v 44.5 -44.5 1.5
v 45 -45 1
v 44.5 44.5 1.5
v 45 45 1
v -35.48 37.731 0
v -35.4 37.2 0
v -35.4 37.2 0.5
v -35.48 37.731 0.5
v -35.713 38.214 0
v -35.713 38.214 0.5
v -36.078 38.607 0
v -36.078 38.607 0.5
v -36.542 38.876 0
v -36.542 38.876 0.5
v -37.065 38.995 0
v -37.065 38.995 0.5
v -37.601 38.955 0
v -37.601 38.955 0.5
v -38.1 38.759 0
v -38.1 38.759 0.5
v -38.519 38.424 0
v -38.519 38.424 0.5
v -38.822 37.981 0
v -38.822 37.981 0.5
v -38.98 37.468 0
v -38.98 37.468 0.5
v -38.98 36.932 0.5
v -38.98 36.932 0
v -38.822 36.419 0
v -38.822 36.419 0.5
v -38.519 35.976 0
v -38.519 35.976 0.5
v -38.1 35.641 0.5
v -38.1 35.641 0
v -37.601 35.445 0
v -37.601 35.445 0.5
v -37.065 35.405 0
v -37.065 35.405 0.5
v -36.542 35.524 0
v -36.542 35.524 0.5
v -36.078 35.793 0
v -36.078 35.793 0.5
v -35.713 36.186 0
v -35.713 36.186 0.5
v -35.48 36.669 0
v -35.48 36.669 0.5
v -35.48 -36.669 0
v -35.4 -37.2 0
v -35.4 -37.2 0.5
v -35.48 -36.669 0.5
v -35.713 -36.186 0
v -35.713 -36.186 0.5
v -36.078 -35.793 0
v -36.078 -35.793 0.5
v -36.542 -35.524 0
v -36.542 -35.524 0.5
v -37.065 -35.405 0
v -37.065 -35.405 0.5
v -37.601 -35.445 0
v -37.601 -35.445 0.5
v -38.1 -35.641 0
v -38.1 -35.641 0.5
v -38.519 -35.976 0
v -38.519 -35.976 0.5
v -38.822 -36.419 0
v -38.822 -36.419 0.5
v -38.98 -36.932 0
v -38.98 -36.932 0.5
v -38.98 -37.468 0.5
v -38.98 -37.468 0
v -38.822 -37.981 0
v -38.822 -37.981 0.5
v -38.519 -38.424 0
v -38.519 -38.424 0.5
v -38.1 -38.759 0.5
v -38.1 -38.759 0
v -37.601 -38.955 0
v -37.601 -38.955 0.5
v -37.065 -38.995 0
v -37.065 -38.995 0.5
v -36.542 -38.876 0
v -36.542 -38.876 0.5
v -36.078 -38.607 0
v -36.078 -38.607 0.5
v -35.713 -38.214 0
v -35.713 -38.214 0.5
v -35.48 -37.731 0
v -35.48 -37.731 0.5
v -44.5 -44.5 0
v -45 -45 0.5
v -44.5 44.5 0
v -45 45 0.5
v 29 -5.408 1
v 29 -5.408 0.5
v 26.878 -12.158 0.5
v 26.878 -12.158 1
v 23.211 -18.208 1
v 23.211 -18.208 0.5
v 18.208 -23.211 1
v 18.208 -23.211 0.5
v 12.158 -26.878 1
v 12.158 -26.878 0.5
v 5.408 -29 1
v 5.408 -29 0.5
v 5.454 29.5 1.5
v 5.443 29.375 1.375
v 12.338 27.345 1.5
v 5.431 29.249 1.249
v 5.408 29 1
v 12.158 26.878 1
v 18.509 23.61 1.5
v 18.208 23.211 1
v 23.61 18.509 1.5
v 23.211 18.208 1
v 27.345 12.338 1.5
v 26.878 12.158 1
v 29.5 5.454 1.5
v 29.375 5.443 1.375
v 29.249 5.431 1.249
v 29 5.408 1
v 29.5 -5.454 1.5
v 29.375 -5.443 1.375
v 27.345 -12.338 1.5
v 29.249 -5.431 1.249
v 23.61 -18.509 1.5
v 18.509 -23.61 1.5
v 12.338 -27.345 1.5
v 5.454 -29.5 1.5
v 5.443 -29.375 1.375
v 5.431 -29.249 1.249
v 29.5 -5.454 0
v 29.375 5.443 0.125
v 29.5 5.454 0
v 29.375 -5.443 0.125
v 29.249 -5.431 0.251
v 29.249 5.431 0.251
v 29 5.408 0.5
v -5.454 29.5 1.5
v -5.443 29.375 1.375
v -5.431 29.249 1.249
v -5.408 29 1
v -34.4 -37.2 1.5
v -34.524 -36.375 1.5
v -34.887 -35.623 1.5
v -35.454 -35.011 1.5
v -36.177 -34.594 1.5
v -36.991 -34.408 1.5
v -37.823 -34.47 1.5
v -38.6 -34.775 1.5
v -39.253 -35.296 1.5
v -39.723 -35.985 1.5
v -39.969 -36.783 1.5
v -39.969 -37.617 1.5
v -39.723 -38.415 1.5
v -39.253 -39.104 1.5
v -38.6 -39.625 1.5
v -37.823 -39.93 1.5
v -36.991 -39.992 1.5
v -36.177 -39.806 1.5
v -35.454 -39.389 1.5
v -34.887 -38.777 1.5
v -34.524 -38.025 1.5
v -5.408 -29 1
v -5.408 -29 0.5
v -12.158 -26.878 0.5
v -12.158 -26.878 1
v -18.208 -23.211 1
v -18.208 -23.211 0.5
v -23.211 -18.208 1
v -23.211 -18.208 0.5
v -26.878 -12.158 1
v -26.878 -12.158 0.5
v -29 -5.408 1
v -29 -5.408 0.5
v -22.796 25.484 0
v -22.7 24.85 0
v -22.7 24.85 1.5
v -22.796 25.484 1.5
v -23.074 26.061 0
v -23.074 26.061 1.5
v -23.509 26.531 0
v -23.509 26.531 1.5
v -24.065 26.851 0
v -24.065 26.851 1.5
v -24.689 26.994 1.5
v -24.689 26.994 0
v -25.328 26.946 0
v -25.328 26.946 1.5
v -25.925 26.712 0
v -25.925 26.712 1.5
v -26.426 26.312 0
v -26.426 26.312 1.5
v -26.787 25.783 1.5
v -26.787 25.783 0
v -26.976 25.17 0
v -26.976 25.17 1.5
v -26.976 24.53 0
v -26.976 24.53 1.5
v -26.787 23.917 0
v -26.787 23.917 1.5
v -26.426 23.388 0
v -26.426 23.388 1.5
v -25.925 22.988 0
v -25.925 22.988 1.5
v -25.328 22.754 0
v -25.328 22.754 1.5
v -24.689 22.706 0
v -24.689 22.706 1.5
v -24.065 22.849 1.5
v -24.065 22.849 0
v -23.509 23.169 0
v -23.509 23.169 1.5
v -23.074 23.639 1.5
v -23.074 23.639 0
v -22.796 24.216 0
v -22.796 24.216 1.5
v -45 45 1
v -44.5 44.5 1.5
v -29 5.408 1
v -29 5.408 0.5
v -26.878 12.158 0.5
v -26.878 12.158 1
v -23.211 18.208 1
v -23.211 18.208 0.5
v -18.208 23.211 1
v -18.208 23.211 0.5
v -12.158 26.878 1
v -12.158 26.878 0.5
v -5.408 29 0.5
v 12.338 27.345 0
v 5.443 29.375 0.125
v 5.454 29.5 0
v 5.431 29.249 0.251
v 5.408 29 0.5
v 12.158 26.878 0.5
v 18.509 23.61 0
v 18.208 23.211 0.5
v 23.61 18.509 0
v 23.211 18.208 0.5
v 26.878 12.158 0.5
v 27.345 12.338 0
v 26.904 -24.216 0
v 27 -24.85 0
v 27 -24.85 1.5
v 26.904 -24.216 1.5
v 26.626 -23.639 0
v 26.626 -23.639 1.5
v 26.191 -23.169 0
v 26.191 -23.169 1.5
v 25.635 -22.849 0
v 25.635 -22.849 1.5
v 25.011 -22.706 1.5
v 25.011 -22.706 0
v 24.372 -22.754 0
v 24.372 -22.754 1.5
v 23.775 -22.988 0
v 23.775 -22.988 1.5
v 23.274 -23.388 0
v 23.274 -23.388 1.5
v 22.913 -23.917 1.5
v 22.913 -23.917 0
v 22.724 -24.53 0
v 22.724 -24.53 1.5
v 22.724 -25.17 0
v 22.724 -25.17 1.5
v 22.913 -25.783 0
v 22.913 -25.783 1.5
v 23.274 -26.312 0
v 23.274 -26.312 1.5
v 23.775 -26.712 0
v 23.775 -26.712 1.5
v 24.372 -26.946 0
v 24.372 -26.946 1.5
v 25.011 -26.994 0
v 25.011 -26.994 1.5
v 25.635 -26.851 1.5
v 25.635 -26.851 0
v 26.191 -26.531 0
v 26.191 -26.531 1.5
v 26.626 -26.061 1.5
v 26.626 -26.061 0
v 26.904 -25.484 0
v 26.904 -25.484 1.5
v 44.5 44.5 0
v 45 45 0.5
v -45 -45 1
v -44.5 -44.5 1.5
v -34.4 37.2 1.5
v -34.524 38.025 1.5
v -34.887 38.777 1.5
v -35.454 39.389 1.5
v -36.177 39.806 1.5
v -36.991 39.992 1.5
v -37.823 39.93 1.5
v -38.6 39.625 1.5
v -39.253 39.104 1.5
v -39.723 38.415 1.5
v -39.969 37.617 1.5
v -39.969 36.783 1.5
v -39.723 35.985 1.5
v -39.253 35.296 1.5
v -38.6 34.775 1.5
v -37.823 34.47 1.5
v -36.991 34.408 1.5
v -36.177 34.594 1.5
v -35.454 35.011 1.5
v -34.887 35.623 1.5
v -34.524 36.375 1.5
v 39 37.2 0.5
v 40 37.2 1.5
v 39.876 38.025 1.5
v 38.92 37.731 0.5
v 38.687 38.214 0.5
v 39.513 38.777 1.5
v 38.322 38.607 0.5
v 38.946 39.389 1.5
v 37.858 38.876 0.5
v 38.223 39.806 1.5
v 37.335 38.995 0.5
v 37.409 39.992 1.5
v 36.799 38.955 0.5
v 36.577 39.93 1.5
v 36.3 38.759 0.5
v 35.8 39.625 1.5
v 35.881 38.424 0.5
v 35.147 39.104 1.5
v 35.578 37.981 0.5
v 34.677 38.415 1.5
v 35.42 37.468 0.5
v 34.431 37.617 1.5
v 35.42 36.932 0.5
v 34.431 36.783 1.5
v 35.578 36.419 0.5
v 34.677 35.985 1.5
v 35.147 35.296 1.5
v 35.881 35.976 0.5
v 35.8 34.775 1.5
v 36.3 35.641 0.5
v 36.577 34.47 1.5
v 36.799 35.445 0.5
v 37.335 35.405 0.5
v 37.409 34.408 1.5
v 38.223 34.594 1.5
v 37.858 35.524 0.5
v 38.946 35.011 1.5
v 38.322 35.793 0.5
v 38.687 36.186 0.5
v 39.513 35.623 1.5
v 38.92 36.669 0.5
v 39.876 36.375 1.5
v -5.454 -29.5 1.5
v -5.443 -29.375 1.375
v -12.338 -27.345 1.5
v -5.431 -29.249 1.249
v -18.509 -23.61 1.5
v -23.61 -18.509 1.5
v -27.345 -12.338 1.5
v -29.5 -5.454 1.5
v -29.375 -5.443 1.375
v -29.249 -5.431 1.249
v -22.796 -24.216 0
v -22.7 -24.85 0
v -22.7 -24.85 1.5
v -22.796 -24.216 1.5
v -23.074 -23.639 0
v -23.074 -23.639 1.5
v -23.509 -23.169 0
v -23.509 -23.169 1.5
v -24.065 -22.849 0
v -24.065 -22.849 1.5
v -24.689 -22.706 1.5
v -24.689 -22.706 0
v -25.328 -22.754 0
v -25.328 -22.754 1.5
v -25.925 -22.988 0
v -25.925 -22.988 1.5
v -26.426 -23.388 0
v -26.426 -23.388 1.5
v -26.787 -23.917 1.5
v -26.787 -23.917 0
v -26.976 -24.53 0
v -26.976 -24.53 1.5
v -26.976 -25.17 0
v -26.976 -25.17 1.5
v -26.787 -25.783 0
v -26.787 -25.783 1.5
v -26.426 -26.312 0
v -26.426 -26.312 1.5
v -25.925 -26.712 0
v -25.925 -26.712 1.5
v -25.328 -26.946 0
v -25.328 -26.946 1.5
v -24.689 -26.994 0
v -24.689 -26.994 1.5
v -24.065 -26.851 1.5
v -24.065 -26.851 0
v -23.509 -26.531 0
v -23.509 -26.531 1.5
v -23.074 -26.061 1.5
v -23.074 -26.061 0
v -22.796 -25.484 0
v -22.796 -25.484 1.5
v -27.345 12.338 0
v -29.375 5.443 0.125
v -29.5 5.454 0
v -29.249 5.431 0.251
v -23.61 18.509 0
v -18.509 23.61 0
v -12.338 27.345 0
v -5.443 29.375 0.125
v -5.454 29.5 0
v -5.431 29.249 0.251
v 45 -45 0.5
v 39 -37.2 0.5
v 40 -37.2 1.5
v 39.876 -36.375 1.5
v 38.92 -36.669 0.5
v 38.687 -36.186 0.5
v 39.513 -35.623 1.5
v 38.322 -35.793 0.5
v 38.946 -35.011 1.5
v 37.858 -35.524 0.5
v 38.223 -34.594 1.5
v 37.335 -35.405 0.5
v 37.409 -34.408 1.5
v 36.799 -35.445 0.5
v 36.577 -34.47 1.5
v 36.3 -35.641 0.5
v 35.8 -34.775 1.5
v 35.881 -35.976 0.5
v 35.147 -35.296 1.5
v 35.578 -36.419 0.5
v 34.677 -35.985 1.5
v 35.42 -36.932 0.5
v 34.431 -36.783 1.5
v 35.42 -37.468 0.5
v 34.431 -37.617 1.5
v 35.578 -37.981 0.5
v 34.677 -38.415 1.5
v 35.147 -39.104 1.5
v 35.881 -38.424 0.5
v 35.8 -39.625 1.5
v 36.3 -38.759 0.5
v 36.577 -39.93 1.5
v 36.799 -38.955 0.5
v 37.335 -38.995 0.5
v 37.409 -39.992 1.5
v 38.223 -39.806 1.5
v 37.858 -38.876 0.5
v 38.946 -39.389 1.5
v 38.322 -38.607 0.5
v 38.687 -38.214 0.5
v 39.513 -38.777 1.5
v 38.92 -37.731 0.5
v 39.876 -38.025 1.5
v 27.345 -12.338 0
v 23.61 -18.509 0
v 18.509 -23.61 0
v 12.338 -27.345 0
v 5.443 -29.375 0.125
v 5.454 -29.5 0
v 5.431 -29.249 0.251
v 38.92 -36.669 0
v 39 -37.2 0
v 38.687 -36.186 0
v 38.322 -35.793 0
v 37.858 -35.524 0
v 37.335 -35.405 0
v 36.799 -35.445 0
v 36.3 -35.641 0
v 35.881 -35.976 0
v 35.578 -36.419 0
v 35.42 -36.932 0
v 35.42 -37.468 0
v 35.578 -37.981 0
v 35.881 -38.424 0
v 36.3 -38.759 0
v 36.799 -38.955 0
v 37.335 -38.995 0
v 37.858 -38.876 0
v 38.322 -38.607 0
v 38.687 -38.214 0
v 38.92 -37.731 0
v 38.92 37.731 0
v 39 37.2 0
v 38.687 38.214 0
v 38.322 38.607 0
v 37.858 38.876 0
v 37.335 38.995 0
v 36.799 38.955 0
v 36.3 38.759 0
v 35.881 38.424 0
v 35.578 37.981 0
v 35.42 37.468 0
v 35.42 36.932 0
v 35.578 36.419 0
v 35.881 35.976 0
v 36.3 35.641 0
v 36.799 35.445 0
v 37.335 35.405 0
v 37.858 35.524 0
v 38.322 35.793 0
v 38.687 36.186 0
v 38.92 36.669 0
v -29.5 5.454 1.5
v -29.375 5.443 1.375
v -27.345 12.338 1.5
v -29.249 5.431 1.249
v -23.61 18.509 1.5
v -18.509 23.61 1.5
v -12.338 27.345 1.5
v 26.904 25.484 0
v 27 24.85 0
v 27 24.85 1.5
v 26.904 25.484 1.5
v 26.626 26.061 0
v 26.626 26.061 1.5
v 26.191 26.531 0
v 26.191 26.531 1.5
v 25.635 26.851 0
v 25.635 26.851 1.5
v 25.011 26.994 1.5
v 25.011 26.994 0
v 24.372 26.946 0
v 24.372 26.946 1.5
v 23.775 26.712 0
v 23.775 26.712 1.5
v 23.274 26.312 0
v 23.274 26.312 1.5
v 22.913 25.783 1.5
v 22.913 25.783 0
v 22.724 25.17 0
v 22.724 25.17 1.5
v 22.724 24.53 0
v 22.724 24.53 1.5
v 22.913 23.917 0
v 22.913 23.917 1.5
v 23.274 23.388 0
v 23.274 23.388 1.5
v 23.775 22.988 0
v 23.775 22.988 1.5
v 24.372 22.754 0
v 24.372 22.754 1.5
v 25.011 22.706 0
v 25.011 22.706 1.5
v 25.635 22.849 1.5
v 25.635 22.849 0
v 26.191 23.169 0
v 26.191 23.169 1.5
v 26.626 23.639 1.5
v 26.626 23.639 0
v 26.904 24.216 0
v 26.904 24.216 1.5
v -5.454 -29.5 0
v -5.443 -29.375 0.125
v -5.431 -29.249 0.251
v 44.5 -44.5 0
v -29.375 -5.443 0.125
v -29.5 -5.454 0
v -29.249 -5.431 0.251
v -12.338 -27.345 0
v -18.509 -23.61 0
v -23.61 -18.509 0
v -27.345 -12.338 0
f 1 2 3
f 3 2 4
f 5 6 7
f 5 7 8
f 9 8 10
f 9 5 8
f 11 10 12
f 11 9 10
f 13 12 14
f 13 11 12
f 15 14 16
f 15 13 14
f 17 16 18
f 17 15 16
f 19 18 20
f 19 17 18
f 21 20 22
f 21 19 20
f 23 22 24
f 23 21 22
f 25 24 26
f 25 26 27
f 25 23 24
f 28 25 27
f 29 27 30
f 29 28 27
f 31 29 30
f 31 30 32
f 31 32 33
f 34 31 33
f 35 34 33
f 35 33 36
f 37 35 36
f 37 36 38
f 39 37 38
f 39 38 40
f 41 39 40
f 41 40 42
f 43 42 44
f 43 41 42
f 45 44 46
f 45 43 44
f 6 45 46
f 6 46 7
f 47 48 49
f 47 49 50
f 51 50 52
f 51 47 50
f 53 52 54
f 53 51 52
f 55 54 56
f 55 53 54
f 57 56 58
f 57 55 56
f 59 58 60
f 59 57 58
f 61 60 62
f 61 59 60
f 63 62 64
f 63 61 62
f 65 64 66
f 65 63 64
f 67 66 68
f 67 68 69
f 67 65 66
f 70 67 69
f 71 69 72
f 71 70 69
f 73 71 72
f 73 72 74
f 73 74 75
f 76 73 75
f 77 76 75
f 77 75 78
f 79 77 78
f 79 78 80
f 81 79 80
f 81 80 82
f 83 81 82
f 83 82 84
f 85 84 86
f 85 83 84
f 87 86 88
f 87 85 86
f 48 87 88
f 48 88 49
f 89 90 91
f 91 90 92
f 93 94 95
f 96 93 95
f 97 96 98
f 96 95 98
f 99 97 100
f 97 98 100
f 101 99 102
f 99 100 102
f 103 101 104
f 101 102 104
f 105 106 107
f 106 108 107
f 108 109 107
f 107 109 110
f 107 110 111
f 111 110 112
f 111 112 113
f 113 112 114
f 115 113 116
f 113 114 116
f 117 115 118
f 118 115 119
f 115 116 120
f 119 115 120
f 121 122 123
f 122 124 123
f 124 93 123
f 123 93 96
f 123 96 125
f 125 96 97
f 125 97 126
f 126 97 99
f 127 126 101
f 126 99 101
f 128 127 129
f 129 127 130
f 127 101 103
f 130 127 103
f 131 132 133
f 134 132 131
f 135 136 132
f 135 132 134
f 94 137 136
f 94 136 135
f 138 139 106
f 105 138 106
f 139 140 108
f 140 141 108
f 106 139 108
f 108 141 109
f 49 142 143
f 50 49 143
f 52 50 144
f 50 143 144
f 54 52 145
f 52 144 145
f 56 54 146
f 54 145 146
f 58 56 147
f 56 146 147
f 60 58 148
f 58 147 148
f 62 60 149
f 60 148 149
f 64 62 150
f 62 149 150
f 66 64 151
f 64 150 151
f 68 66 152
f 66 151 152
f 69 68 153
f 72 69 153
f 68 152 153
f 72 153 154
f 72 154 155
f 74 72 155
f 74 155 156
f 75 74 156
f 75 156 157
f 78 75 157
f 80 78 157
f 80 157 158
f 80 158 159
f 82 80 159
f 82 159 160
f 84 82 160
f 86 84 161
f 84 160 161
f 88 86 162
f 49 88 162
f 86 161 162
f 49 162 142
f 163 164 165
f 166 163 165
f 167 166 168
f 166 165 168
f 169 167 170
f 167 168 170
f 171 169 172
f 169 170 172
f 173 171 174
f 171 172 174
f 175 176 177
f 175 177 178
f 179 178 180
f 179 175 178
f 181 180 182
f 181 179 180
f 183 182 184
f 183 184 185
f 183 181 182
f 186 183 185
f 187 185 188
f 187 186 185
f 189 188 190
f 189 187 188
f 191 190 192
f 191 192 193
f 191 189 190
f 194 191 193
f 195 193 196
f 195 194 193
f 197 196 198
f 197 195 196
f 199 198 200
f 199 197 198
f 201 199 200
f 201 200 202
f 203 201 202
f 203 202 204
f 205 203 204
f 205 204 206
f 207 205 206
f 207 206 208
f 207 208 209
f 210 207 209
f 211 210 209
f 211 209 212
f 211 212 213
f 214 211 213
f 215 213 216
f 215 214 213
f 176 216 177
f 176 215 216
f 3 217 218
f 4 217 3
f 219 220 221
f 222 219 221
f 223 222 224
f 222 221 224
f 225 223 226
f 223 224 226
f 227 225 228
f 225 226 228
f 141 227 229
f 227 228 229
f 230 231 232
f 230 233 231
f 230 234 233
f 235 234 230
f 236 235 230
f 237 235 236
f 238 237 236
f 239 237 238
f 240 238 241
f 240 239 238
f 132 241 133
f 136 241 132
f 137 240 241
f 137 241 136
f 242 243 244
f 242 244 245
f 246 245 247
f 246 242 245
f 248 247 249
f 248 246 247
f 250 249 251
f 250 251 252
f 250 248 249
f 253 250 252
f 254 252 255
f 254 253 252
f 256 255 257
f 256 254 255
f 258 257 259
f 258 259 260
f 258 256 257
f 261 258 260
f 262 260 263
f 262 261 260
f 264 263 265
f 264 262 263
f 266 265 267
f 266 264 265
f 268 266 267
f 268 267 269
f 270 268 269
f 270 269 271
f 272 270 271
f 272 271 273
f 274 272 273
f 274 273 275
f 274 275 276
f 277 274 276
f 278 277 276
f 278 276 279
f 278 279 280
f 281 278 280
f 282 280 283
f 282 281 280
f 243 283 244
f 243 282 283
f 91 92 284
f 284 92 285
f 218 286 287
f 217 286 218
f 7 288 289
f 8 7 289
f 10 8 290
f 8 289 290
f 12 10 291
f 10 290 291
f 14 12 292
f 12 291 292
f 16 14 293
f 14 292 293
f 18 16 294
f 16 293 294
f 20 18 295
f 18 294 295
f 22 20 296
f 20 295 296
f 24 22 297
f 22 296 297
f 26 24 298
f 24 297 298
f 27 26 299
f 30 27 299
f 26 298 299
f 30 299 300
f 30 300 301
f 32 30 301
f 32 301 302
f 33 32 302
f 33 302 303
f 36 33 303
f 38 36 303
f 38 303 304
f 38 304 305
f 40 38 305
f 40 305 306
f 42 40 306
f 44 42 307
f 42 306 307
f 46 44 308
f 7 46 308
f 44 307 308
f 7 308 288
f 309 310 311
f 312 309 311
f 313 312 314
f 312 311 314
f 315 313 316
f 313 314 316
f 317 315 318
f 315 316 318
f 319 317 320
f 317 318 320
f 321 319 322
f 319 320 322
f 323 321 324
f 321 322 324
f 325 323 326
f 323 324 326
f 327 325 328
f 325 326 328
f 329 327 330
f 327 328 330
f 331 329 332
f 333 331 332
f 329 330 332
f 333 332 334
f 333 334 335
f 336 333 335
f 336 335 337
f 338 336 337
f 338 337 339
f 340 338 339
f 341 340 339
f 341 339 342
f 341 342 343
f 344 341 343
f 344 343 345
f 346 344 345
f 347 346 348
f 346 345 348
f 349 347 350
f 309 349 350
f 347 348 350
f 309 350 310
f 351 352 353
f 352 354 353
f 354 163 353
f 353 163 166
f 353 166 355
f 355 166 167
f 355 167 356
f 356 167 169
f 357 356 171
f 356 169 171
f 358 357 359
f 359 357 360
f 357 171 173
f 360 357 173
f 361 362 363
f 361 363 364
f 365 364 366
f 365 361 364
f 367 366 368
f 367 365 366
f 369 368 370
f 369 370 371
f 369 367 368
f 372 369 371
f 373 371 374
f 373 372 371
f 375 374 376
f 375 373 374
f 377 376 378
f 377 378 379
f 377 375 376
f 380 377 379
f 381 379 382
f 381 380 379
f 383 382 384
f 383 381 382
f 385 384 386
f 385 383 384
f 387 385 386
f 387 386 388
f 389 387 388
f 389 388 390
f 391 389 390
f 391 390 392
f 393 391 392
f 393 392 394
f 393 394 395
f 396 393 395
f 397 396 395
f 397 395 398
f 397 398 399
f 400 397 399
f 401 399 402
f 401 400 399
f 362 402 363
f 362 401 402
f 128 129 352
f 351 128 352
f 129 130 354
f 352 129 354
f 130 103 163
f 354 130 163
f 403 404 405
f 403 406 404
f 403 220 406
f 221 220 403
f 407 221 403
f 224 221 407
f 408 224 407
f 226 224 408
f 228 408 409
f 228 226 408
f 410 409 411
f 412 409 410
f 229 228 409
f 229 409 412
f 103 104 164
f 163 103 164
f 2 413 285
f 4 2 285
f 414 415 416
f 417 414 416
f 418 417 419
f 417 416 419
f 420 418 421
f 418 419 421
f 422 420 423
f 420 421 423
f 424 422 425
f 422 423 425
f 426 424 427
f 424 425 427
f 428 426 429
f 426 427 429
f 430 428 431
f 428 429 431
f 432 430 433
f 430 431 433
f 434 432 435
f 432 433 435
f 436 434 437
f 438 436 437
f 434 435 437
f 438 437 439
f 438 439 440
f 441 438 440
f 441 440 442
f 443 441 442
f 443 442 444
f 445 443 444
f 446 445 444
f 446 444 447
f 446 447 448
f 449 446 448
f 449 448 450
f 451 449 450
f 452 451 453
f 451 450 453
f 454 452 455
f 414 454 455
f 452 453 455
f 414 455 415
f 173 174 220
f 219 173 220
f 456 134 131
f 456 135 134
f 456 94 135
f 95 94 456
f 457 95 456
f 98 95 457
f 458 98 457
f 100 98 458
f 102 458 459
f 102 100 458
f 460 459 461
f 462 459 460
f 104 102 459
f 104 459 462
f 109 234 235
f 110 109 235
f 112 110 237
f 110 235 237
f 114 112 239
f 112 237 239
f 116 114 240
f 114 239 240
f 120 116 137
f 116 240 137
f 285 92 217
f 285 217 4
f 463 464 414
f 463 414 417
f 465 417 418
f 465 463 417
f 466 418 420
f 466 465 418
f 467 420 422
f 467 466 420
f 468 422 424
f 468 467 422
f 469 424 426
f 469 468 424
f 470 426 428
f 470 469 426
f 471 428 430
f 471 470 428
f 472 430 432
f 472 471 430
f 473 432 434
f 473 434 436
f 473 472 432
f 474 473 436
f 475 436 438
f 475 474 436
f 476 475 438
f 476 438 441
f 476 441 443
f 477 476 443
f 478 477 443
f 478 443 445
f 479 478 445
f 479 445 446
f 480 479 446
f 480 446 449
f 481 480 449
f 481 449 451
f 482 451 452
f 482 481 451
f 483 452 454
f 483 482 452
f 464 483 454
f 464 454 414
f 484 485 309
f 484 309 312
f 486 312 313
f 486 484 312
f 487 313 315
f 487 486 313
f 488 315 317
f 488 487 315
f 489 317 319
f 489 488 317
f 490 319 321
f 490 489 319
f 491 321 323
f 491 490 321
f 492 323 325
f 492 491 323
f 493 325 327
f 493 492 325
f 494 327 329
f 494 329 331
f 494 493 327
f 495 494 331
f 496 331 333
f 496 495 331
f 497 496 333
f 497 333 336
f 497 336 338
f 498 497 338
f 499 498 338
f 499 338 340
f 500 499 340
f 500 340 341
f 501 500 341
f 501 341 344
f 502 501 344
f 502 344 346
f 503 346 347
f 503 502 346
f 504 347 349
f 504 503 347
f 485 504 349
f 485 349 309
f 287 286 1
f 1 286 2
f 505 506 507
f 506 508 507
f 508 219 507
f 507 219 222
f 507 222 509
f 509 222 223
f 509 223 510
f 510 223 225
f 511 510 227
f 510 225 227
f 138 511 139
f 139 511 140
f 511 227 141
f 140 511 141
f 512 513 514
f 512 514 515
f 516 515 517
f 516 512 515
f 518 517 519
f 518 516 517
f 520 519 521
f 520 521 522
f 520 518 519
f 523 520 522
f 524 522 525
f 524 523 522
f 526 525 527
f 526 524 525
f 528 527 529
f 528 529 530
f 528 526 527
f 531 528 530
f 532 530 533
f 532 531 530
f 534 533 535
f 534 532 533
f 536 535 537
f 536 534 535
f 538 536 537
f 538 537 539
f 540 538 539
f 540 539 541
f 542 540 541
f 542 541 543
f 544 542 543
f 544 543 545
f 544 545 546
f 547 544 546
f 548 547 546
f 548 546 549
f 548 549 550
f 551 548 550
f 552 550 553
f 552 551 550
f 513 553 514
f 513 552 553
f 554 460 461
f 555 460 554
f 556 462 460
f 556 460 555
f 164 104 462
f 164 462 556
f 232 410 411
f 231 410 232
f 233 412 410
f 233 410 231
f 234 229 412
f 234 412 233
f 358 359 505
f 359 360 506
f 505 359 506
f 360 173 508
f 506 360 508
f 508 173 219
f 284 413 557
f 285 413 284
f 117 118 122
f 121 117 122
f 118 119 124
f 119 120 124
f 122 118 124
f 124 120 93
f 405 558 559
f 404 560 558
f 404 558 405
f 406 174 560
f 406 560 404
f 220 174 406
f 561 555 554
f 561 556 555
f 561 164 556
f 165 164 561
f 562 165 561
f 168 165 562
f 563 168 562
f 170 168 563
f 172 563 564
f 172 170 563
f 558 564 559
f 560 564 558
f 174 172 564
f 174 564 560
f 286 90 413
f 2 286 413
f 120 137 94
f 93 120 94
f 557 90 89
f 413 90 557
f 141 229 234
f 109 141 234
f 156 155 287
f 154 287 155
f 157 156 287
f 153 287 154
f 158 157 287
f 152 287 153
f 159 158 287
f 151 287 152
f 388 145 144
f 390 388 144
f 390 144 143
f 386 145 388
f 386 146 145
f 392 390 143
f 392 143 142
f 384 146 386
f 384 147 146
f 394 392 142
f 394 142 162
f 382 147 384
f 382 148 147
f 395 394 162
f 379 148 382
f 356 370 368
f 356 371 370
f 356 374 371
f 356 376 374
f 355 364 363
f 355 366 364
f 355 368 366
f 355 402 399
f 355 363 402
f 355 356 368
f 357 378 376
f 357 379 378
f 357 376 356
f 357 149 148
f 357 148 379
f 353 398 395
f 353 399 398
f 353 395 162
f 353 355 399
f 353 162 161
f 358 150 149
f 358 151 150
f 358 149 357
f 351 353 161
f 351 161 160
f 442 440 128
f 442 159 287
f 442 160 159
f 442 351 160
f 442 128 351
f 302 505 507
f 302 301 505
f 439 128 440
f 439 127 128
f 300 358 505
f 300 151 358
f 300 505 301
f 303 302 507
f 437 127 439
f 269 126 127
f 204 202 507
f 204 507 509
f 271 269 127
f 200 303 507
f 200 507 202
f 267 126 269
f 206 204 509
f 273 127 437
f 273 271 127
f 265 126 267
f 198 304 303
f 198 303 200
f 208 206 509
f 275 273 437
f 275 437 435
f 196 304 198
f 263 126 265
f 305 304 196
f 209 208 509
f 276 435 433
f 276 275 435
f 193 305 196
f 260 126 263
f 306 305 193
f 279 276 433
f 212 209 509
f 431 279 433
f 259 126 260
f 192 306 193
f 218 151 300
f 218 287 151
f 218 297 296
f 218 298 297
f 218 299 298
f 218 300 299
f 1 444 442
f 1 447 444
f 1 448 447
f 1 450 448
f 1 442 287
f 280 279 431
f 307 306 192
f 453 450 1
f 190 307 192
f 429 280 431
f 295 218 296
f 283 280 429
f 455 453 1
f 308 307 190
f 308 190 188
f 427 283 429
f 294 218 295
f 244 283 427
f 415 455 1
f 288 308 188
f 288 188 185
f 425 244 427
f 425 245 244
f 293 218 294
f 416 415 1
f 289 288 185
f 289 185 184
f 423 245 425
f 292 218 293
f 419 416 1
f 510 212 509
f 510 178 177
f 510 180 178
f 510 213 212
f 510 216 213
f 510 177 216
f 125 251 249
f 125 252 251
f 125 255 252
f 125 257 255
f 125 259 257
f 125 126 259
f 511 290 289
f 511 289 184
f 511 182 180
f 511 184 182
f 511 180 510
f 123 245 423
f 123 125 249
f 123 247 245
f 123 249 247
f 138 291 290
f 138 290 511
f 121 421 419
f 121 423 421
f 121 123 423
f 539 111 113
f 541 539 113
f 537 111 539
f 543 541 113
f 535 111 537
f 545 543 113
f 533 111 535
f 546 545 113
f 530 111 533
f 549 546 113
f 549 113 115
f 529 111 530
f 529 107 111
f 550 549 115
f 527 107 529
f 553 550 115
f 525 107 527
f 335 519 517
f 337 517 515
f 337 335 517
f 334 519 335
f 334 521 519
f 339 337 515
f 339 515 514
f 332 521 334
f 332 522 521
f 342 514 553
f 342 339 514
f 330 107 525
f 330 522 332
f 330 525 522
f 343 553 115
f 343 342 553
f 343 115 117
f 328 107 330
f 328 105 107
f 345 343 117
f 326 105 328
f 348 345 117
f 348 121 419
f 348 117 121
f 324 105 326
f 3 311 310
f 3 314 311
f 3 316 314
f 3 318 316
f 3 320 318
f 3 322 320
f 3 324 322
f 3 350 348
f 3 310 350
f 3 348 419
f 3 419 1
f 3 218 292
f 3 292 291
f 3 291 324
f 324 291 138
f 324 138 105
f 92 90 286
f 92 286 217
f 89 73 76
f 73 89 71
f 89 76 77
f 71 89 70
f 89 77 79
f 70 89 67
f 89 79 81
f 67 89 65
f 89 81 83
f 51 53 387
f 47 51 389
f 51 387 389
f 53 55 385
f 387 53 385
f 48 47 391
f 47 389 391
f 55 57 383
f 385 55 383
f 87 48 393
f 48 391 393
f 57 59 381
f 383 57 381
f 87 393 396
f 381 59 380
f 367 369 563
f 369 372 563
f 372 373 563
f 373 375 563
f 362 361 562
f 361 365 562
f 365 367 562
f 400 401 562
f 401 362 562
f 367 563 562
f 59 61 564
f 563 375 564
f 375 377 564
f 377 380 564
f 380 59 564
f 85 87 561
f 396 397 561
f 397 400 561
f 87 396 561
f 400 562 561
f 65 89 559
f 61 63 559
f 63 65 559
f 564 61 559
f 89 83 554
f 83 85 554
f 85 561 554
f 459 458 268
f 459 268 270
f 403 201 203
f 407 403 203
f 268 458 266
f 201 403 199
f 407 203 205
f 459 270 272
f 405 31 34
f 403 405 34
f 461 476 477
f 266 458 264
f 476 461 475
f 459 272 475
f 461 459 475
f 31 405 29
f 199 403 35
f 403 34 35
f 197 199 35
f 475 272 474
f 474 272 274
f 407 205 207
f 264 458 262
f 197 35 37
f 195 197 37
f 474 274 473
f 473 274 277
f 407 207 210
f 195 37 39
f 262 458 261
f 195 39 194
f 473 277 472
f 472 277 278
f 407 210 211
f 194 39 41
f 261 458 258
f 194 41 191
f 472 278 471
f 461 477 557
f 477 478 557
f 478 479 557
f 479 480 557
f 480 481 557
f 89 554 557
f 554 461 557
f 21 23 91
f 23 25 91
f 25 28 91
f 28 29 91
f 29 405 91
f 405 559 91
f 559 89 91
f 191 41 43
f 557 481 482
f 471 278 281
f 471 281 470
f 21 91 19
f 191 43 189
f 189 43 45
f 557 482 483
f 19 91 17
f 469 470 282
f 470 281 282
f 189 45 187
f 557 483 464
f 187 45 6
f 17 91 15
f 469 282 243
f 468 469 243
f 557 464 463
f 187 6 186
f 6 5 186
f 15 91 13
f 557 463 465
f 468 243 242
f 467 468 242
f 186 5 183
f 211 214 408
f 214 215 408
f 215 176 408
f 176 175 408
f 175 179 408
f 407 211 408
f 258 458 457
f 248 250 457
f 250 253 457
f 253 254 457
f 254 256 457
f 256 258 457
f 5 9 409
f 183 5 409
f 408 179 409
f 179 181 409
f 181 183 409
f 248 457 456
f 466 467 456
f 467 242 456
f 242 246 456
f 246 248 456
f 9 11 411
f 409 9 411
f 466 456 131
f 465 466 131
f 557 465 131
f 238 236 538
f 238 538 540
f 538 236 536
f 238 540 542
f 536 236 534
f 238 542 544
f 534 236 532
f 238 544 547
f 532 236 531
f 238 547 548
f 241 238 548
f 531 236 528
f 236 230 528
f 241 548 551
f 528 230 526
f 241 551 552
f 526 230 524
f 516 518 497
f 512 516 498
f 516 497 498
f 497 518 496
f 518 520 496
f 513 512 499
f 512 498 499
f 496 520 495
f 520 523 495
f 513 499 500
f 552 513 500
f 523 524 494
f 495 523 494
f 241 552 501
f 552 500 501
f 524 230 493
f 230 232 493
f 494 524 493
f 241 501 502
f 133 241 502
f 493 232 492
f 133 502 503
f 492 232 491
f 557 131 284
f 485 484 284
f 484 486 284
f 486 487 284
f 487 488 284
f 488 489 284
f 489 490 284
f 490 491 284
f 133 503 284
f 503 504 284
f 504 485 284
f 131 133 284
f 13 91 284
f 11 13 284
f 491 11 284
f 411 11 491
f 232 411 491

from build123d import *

# Parameters (mm, degrees)
F0_W     = 90
F0_H     = 90
F0_R     = 1.8
F0_R_2   = 2.15
F1_DEPTH = 1.5
F2_SIZE2 = 1
F2_SIZE  = 1
F3_SIZE  = 0.5


with BuildPart() as f1:
    # F0 (on Top) → F1 (new body)
    with BuildSketch(Plane.XY):
        Rectangle(F0_W, F0_H)
        with Locations((-37.2, -37.2)):
            Circle(F0_R, mode=Mode.SUBTRACT)
        with Locations((-24.85, -24.85)):
            Circle(F0_R_2, mode=Mode.SUBTRACT)
        with Locations((37.2, -37.2)):
            Circle(F0_R, mode=Mode.SUBTRACT)
        with Locations((24.85, -24.85)):
            Circle(F0_R_2, mode=Mode.SUBTRACT)
        with Locations((-24.85, 24.85)):
            Circle(F0_R_2, mode=Mode.SUBTRACT)
        with Locations((-37.2, 37.2)):
            Circle(F0_R, mode=Mode.SUBTRACT)
        with BuildLine():
            Line((-5.408327, 29), (5.408327, 29))
            ThreePointArc((5.408327, 29), (20.85965, 20.85965), (29, 5.408327))
            Line((29, 5.408327), (29, -5.408327))
            ThreePointArc((29, -5.408327), (20.85965, -20.85965), (5.408327, -29))
            Line((5.408327, -29), (-5.408327, -29))
            ThreePointArc((-5.408327, -29), (-20.85965, -20.85965), (-29, -5.408327))
            Line((-29, -5.408327), (-29, 5.408327))
            ThreePointArc((-29, 5.408327), (-20.85965, 20.85965), (-5.408327, 29))
        make_face(mode=Mode.SUBTRACT)
        with Locations((24.85, 24.85)):
            Circle(F0_R_2, mode=Mode.SUBTRACT)
        with Locations((37.2, 37.2)):
            Circle(F0_R, mode=Mode.SUBTRACT)
    extrude(amount=F1_DEPTH)

    # F2
    f2_edges = [f1.edges().sort_by_distance(p)[0] for p in [
        (-39, 37.2, 1.5),
        (35.4, 37.2, 1.5),
        (35.4, -37.2, 1.5),
        (-39, -37.2, 1.5),
    ]]
    chamfer(f2_edges, length=F2_SIZE, length2=F2_SIZE2)

    # F3
    f3_edges = [f1.edges().sort_by_distance(p)[0] for p in [
        (0, -45, 0),
        (-45, 0, 0),
        (45, 0, 0),
        (0, 45, 0),
        (-45, 0, 1.5),
        (0, -45, 1.5),
        (45, 0, 1.5),
        (0, 45, 1.5),
        (-20.85965, -20.85965, 0),
        (-20.85965, -20.85965, 1.5),
        (0, -29, 0),
        (0, -29, 1.5),
        (20.85965, -20.85965, 0),
        (20.85965, -20.85965, 1.5),
        (-29, 0, 0),
        (-29, 0, 1.5),
        (-20.85965, 20.85965, 1.5),
        (-20.85965, 20.85965, 0),
        (20.85965, 20.85965, 1.5),
        (29, 0, 1.5),
        (0, 29, 1.5),
        (29, 0, 0),
        (20.85965, 20.85965, 0),
        (0, 29, 0),
    ]]
    chamfer(f3_edges, length=F3_SIZE)


solid = f1.part
